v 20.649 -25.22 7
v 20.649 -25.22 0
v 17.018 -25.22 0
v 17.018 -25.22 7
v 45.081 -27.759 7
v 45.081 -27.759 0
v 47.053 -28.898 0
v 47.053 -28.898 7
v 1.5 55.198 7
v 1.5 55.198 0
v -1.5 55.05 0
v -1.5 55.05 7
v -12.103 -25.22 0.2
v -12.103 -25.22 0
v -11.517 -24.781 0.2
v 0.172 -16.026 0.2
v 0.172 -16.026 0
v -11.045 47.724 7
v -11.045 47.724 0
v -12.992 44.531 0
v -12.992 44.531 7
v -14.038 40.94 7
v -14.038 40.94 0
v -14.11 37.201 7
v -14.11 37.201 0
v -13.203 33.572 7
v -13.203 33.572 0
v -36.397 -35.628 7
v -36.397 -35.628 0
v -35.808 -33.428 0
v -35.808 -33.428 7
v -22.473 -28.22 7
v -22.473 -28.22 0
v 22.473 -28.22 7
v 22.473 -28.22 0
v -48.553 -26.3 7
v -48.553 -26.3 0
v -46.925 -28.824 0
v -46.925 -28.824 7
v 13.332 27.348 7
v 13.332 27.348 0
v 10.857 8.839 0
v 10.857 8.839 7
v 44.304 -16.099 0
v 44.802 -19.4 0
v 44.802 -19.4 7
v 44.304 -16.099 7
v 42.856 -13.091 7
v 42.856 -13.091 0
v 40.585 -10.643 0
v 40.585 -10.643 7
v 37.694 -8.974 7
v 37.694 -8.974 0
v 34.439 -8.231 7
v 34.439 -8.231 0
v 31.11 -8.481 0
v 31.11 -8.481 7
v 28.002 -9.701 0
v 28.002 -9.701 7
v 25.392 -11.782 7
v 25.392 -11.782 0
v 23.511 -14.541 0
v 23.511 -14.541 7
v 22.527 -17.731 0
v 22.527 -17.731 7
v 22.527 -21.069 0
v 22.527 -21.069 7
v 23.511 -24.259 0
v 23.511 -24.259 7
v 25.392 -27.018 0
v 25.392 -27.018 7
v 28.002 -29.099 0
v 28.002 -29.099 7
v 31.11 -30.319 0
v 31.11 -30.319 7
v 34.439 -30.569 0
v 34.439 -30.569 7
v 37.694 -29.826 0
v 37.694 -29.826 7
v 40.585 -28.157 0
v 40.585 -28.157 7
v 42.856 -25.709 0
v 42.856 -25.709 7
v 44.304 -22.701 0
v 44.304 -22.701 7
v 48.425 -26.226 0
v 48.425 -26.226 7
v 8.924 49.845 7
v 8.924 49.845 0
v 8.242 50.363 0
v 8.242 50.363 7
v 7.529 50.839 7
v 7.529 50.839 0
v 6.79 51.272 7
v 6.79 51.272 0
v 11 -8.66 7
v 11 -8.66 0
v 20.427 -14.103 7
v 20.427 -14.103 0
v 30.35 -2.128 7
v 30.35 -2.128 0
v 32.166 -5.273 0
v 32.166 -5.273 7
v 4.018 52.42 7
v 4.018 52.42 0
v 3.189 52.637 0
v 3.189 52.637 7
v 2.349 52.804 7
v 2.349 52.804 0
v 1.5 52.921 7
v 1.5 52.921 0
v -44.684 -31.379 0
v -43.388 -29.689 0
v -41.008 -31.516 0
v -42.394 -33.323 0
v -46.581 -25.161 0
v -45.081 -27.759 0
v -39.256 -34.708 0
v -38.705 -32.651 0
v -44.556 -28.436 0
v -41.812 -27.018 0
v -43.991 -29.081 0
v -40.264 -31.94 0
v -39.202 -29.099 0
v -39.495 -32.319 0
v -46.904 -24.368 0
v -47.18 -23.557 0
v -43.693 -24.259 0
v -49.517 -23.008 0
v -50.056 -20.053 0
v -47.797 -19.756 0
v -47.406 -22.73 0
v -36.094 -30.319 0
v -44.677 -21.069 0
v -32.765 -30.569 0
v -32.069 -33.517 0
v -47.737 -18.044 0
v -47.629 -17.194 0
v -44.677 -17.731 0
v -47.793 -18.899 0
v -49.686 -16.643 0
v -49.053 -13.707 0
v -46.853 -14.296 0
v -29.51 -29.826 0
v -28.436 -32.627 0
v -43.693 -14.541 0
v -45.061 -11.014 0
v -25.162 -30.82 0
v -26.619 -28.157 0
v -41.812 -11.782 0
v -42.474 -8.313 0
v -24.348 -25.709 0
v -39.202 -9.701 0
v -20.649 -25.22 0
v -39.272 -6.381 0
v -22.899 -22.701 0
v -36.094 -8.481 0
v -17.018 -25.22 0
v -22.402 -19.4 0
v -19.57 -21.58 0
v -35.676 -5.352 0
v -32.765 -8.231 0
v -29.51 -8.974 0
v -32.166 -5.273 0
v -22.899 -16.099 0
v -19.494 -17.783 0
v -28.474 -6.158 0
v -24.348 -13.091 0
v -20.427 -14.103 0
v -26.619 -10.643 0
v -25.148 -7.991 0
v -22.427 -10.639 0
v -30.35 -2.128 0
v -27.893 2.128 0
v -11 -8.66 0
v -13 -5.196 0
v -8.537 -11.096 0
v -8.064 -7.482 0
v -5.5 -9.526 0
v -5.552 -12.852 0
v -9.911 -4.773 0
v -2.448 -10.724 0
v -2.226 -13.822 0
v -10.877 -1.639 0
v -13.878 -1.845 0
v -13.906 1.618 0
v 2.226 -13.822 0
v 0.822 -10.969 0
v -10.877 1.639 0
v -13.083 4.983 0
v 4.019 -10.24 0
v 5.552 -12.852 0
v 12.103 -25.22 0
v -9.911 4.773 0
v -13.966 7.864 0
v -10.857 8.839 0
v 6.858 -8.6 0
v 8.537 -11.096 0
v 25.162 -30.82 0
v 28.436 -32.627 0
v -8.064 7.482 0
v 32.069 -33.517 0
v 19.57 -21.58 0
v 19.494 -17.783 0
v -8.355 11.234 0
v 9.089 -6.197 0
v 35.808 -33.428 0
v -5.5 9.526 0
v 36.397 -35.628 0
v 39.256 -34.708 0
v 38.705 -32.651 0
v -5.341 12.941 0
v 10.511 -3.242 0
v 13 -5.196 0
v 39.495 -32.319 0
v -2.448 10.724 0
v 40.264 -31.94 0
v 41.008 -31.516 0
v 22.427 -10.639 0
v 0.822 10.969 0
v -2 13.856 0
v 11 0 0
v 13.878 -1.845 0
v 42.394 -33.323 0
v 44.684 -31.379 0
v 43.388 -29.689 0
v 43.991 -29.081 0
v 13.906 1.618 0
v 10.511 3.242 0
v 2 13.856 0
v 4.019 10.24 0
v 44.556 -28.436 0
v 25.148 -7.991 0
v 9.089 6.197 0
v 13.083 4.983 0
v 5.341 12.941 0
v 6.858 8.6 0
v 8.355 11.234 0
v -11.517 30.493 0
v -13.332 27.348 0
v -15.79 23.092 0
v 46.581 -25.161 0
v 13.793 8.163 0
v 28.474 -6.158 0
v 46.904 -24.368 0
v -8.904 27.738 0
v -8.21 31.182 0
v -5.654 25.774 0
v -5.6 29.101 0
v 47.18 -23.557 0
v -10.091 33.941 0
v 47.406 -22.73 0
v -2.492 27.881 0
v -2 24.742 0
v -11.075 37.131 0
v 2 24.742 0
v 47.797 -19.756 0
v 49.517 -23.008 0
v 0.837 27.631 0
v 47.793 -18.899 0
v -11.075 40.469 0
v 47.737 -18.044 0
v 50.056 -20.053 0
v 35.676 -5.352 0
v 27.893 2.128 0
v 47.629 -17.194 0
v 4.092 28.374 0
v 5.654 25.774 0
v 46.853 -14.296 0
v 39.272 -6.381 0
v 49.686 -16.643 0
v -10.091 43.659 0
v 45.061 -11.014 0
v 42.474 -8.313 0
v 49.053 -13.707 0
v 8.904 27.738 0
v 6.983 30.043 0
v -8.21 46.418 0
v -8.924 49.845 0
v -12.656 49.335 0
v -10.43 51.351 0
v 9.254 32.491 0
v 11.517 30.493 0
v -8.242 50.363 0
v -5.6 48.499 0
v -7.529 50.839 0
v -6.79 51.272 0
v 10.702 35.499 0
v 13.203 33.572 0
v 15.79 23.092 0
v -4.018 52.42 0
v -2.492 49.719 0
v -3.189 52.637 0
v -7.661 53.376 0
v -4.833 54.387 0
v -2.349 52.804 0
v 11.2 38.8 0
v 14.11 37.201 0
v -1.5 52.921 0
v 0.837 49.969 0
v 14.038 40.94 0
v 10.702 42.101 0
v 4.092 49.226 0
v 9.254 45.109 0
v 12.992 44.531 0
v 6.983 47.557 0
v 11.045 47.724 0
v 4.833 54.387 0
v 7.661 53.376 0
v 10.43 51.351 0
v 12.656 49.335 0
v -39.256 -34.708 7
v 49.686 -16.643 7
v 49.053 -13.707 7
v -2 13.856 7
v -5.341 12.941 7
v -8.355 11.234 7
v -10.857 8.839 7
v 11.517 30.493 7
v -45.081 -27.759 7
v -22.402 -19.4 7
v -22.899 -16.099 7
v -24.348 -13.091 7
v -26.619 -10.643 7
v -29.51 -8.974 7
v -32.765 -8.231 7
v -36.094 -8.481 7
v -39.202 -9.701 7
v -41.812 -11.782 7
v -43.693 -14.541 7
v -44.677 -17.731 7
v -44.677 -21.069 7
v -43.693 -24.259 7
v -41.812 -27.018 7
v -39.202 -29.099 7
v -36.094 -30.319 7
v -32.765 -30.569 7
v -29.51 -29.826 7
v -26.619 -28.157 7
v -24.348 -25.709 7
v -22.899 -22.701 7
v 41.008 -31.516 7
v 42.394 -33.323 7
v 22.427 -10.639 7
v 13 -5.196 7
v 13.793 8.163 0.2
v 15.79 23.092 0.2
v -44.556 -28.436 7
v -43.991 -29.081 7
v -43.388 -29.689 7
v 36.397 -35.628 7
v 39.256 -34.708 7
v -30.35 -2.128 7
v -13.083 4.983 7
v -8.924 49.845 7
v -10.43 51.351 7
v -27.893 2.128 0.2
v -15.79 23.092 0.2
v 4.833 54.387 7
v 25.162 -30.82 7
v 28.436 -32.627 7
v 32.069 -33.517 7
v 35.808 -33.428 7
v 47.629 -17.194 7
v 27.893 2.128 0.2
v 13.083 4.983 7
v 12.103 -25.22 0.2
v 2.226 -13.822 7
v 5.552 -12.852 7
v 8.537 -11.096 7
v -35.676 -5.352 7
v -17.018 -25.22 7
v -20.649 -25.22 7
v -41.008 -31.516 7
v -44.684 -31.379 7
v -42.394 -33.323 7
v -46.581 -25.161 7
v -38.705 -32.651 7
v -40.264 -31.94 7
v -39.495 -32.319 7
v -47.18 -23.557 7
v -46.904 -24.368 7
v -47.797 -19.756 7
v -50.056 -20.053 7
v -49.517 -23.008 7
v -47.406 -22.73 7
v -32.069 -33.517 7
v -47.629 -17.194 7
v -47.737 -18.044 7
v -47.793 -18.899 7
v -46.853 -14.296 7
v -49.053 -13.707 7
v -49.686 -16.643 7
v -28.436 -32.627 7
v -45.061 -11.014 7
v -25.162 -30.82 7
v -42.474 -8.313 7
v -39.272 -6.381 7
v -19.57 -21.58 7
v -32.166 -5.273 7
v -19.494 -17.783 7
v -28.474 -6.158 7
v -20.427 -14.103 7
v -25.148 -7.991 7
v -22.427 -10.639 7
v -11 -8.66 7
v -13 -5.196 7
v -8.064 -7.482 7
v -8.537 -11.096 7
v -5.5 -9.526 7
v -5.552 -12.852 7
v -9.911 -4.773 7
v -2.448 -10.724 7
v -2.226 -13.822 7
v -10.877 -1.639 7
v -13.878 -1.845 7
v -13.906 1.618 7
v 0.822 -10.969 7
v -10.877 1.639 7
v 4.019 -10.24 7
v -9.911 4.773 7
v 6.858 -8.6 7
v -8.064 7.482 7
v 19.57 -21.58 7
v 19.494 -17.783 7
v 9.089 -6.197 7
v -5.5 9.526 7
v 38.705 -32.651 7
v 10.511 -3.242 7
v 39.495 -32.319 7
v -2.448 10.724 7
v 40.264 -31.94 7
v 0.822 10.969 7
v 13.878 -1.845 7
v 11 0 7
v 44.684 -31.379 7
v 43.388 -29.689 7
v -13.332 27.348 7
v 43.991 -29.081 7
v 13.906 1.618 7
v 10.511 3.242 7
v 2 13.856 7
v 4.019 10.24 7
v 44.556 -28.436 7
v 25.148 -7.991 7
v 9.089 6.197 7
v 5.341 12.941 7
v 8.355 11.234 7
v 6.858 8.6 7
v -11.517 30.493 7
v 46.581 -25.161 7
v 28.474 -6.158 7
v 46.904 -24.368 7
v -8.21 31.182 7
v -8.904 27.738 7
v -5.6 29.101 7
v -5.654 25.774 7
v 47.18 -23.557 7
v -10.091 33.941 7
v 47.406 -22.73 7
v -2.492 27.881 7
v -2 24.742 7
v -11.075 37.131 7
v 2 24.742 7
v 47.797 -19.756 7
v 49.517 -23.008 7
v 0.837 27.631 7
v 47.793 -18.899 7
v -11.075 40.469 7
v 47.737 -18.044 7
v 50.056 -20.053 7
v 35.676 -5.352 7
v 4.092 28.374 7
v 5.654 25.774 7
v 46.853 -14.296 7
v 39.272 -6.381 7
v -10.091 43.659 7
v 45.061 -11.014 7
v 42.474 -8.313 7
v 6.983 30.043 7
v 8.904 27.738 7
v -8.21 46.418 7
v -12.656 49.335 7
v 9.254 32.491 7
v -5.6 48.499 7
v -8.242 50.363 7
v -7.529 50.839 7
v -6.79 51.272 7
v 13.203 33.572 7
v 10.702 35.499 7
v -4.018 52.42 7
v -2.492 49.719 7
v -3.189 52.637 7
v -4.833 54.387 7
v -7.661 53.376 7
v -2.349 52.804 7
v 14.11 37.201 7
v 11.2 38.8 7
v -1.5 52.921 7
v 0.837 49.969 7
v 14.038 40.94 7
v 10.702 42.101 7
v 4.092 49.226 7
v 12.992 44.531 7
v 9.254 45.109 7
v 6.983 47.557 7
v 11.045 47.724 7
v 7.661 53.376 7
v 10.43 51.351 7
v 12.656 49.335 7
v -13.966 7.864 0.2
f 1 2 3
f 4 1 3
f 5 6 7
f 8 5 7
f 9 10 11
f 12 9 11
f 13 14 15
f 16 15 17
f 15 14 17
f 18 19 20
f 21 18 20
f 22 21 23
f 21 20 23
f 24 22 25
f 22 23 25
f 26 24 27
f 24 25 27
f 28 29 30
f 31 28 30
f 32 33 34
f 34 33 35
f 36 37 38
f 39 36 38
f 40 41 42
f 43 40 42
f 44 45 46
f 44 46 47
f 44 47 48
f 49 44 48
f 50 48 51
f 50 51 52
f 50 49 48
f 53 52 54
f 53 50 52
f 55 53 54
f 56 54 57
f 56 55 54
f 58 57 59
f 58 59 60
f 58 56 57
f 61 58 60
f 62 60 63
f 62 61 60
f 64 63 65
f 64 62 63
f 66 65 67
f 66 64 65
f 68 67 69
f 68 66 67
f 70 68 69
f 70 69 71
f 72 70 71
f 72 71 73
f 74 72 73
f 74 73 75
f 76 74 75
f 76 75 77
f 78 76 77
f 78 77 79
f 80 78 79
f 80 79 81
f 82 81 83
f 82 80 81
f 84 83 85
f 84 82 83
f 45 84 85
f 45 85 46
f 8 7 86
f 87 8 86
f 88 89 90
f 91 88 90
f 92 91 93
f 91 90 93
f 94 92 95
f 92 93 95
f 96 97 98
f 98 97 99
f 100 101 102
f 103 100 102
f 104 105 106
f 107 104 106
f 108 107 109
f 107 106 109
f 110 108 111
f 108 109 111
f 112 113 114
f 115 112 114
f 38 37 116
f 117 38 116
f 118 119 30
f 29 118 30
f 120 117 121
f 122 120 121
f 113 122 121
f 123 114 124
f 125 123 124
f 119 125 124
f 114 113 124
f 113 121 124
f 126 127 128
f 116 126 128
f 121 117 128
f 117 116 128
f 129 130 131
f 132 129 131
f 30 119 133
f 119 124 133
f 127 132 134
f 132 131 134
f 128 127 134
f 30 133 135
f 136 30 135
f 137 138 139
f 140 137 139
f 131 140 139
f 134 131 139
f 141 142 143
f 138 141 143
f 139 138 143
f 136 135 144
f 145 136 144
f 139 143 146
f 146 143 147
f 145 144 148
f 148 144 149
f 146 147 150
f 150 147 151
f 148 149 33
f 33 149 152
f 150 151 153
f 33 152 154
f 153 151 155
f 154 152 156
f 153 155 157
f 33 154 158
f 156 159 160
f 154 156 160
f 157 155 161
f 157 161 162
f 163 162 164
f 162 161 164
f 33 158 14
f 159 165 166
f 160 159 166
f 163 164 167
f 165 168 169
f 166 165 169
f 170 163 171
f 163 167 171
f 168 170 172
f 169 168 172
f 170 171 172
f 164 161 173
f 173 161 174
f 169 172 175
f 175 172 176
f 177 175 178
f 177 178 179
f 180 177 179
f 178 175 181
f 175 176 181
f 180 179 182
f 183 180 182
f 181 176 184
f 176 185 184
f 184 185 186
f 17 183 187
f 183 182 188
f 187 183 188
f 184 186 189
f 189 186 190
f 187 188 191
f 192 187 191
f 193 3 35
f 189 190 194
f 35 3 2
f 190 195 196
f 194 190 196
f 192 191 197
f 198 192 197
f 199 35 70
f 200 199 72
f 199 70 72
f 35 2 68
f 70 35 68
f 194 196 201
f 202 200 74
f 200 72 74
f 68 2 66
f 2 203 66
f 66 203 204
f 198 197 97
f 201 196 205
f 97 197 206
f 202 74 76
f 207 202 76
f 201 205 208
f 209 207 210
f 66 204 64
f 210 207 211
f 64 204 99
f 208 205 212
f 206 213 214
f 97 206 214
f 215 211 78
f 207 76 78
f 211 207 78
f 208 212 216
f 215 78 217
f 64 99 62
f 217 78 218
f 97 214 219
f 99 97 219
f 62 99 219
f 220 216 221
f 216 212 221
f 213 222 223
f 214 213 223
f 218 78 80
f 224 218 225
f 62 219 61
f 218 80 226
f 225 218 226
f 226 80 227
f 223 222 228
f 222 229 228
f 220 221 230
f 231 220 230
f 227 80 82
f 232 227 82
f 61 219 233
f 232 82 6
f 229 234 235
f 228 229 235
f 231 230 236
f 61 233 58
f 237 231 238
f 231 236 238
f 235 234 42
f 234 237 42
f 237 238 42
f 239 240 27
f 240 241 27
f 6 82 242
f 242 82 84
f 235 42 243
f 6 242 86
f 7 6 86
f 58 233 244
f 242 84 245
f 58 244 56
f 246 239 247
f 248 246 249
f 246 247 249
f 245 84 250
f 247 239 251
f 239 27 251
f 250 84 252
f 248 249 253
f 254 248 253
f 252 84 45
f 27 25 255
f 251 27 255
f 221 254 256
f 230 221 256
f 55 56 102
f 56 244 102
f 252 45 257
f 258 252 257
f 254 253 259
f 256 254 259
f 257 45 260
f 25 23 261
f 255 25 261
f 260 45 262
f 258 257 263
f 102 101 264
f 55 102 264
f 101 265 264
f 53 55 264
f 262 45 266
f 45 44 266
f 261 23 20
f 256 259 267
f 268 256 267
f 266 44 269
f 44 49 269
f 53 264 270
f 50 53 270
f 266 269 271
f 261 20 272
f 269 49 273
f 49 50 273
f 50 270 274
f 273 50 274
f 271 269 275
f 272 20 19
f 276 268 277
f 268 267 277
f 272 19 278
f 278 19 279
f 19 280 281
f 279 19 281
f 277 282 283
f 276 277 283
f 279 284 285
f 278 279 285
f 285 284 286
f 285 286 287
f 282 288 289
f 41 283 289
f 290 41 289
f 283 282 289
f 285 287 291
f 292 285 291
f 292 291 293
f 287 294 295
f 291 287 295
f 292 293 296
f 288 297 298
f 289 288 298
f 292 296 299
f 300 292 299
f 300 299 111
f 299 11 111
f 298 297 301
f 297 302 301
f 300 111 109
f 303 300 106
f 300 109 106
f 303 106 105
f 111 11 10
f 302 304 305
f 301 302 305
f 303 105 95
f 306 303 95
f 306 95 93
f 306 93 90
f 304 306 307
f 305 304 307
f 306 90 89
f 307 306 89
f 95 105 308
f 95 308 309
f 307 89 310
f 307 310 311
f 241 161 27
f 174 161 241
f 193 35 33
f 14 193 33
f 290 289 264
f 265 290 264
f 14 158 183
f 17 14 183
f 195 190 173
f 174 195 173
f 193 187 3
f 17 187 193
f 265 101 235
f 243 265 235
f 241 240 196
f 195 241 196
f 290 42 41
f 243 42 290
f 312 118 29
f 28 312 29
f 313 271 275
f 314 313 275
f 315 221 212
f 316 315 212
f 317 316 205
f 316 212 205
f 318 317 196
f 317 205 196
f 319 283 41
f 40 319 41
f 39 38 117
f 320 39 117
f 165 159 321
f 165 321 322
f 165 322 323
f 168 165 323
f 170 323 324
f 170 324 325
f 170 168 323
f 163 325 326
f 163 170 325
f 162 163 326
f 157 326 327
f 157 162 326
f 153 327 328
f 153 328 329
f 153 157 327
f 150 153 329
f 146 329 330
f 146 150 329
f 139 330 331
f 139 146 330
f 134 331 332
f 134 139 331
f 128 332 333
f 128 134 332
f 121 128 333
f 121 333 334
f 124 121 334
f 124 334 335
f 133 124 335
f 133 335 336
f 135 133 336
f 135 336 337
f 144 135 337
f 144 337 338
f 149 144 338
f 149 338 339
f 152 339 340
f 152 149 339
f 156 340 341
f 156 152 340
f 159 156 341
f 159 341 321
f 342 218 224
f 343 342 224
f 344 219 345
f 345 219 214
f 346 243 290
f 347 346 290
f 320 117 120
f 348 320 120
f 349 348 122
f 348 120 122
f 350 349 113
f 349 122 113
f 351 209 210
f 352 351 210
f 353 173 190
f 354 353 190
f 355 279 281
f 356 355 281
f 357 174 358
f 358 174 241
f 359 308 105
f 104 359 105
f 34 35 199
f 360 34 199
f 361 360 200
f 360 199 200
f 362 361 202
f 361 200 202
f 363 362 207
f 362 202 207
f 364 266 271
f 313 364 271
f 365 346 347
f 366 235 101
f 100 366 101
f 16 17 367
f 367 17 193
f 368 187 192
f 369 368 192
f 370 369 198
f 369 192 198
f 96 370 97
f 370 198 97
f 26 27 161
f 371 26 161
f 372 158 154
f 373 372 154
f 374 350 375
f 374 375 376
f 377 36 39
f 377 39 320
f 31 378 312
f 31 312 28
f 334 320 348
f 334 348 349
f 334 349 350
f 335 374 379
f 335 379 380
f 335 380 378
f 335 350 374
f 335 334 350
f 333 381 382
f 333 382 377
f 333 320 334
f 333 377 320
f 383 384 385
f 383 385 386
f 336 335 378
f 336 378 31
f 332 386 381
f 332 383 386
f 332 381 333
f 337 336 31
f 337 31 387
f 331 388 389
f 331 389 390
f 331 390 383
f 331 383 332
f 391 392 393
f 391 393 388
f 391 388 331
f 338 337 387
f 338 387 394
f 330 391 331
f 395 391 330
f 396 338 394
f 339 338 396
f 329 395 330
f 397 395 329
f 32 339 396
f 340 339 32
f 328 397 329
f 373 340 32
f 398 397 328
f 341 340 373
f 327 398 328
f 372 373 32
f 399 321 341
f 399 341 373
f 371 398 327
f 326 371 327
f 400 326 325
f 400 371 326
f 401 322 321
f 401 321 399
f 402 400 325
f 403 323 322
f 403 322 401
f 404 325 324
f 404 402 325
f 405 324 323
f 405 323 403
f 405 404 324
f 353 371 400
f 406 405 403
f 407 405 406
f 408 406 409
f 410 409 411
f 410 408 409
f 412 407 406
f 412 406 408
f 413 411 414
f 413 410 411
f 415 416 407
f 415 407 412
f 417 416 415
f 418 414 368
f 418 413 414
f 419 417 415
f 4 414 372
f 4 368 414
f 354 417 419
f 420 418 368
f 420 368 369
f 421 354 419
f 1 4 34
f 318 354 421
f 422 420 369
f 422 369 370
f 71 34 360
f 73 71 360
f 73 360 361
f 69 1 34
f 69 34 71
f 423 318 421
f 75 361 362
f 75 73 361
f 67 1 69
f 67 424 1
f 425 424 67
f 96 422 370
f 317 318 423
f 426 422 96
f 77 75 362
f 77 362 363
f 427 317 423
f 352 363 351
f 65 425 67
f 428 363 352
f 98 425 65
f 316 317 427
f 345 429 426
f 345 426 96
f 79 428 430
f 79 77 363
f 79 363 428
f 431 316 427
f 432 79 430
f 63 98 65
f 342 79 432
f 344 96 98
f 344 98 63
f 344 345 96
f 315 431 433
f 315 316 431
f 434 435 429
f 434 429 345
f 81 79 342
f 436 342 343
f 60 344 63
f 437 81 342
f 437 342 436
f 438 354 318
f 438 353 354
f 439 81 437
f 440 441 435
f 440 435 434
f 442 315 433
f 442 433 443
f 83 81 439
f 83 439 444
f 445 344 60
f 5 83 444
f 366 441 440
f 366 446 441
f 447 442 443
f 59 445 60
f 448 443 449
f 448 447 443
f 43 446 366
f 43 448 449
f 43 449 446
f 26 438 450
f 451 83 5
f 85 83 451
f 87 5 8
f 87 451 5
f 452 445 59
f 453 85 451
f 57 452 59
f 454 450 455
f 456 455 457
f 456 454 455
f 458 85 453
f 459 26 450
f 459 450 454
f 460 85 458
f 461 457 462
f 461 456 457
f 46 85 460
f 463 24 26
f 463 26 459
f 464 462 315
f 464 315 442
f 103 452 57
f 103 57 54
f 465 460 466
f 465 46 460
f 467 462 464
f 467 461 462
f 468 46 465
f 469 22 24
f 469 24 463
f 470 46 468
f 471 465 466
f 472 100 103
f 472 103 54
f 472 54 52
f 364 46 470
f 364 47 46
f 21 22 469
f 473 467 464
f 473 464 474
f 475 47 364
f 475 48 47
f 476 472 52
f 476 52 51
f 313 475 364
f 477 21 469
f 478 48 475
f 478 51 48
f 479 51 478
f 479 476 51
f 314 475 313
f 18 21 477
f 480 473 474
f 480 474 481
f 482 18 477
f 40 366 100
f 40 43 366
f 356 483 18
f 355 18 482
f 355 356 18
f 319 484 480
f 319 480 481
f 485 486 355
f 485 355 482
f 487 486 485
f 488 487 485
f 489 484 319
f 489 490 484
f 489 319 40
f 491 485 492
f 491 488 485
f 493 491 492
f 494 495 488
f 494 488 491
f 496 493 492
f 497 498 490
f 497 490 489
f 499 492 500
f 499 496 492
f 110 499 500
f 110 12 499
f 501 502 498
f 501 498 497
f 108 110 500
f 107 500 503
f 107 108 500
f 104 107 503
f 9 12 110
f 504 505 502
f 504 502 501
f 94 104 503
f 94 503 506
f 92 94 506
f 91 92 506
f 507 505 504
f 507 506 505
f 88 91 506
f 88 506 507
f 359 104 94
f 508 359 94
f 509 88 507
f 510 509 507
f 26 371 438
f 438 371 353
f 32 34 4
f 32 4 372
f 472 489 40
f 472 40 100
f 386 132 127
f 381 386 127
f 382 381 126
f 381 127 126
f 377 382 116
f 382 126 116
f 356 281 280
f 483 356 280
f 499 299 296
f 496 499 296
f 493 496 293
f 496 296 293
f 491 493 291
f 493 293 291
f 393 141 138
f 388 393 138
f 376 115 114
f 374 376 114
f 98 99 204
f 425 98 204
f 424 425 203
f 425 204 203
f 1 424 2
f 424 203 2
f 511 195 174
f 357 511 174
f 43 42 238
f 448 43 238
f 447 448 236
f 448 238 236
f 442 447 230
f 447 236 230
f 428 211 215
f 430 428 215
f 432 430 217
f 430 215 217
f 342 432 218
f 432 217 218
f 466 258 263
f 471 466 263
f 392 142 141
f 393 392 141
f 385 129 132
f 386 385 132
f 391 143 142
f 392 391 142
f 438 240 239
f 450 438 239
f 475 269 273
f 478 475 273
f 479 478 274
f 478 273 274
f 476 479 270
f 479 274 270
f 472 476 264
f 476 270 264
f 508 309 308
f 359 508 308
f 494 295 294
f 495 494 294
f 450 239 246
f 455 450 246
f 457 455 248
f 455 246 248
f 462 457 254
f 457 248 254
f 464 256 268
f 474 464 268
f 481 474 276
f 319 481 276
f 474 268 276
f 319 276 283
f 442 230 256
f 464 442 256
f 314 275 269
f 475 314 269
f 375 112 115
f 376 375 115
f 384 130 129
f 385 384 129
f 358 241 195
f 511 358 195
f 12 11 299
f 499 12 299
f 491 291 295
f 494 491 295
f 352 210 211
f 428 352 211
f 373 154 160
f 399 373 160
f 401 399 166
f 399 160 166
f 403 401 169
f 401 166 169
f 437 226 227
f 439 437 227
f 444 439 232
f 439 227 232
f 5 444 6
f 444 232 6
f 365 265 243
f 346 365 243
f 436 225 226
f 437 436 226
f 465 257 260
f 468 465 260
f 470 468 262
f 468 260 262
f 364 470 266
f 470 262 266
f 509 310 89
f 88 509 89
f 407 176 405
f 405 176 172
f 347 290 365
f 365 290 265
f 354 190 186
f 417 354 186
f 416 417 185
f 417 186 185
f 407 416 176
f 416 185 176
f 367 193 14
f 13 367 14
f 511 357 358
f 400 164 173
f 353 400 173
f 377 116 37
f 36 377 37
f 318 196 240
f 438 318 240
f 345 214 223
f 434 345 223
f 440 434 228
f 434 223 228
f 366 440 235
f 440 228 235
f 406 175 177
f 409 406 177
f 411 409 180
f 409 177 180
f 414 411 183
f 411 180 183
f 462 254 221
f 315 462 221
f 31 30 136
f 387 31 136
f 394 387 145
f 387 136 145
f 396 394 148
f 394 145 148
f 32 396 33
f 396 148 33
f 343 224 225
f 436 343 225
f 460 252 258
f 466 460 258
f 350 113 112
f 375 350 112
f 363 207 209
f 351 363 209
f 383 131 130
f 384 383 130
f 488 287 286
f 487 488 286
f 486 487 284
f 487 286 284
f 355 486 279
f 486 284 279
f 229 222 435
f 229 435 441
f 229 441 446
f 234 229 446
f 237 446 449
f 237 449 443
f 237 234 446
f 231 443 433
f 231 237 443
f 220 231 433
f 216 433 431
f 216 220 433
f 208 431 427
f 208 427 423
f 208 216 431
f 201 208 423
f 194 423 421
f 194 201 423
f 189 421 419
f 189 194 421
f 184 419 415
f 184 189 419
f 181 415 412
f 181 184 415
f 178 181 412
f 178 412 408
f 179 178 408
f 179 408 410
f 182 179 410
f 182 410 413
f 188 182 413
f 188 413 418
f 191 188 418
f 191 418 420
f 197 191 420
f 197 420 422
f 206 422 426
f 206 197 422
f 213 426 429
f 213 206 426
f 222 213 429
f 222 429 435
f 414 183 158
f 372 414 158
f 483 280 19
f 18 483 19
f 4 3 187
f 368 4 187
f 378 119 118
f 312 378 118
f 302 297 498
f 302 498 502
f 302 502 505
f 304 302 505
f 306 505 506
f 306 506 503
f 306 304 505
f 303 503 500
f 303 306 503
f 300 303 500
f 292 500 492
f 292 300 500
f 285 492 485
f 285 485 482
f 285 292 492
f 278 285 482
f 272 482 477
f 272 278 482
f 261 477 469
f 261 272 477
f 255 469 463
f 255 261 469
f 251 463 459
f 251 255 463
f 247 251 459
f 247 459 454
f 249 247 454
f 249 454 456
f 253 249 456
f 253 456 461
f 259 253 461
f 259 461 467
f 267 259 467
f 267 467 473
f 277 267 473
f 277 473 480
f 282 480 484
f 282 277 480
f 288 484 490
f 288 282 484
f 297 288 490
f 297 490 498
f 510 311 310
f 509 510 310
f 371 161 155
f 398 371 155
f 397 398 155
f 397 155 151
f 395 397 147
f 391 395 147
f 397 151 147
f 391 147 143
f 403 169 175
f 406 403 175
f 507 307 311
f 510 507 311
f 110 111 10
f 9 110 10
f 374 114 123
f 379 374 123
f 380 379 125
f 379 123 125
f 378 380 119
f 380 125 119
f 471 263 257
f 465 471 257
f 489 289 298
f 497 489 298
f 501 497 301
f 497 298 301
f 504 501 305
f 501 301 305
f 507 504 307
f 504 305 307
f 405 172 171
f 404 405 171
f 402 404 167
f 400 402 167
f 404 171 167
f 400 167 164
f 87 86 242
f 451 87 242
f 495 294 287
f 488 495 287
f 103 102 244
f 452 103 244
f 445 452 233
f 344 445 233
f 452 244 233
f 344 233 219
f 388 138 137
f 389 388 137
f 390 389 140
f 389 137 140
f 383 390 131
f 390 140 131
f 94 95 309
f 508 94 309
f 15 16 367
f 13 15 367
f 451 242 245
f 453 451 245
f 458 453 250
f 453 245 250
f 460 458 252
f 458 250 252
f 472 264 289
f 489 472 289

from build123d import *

# Parameters (mm, degrees)
F0_R     = 11.2
F0_R_2   = 11
F1_DEPTH = 7
F3_DEPTH = 6.8


with BuildPart() as f1:
    # F0 (on Top) → F1 (new body)
    with BuildSketch(Plane.XY):
        with BuildLine():
            Line((-12.6559794838, 49.3346591402), (-11.0453985259, 47.7240781823))
            ThreePointArc((-11.0453985259, 47.7240781823), (-14.0378256841, 40.9399649675), (-13.2027236571, 33.572372619))
            Line((-13.2027236571, 33.572372619), (-35.6758893819, -5.3522922233))
            ThreePointArc((-35.6758893819, -5.3522922233), (-42.473962534, -8.3128688274), (-46.852963341, -14.2964433728))
            Line((-46.852963341, -14.2964433728), (-49.0530578444, -13.7069298274))
            Line((-49.0530578444, -13.7069298274), (-49.6863089117, -16.6430792565))
            Line((-49.6863089117, -16.6430792565), (-47.6294204763, -17.1942208517))
            ThreePointArc((-47.6294204763, -17.1942208517), (-47.7713823768, -18.4712755649), (-47.7973240691, -19.7559346444))
            Line((-47.7973240691, -19.7559346444), (-50.0555434173, -20.0532348617))
            Line((-50.0555434173, -20.0532348617), (-49.5169753758, -23.0082179156))
            Line((-49.5169753758, -23.0082179156), (-47.4057454924, -22.7302692285))
            ThreePointArc((-47.4057454924, -22.7302692285), (-47.0481935057, -23.9644404073), (-46.5805427582, -25.1612380929))
            Line((-46.5805427582, -25.1612380929), (-48.5530935264, -26.3000908099))
            Line((-48.5530935264, -26.3000908099), (-46.9246984783, -28.8240381057))
            Line((-46.9246984783, -28.8240381057), (-45.0805427582, -27.7593143042))
            ThreePointArc((-45.0805427582, -27.7593143042), (-44.277910933, -28.7627105744), (-43.3878633329, -29.6894452675))
            Line((-43.3878633329, -29.6894452675), (-44.6841888987, -31.3788496362))
            Line((-44.6841888987, -31.3788496362), (-42.3943825269, -33.3227547688))
            Line((-42.3943825269, -33.3227547688), (-41.0078033121, -31.5157295545))
            ThreePointArc((-41.0078033121, -31.5157295545), (-39.8822850679, -32.1355929298), (-38.705342294, -32.6511776742))
            Line((-38.705342294, -32.6511776742), (-39.2564838892, -34.7080661095))
            Line((-39.2564838892, -34.7080661095), (-36.3970783606, -35.6277293129))
            Line((-36.3970783606, -35.6277293129), (-35.8075648151, -33.4276348095))
            ThreePointArc((-35.8075648151, -33.4276348095), (-28.4361368498, -32.6270961401), (-22.4731657248, -28.2200803957))
            Line((-22.4731657248, -28.2200803957), (22.4731657248, -28.2200803957))
            ThreePointArc((22.4731657248, -28.2200803957), (28.4361368498, -32.6270961401), (35.8075648151, -33.4276348095))
            Line((35.8075648151, -33.4276348095), (36.3970783606, -35.6277293129))
            Line((36.3970783606, -35.6277293129), (39.2564838892, -34.7080661095))
            Line((39.2564838892, -34.7080661095), (38.705342294, -32.6511776742))
            ThreePointArc((38.705342294, -32.6511776742), (39.8822850679, -32.1355929298), (41.0078033121, -31.5157295545))
            Line((41.0078033121, -31.5157295545), (42.3943825269, -33.3227547688))
            Line((42.3943825269, -33.3227547688), (44.6841888987, -31.3788496362))
            Line((44.6841888987, -31.3788496362), (43.3878633329, -29.6894452675))
            ThreePointArc((43.3878633329, -29.6894452675), (44.277910933, -28.7627105744), (45.0805427582, -27.7593143042))
            Line((45.0805427582, -27.7593143042), (47.0530935264, -28.8981670212))
            Line((47.0530935264, -28.8981670212), (48.4246984783, -26.2259618943))
            Line((48.4246984783, -26.2259618943), (46.5805427582, -25.1612380929))
            ThreePointArc((46.5805427582, -25.1612380929), (47.0481935057, -23.9644404073), (47.4057454924, -22.7302692285))
            Line((47.4057454924, -22.7302692285), (49.5169753758, -23.0082179156))
            Line((49.5169753758, -23.0082179156), (50.0555434173, -20.0532348617))
            Line((50.0555434173, -20.0532348617), (47.7973240691, -19.7559346444))
            ThreePointArc((47.7973240691, -19.7559346444), (47.7713823768, -18.4712755649), (47.6294204763, -17.1942208517))
            Line((47.6294204763, -17.1942208517), (49.6863089117, -16.6430792565))
            Line((49.6863089117, -16.6430792565), (49.0530578444, -13.7069298274))
            Line((49.0530578444, -13.7069298274), (46.852963341, -14.2964433728))
            ThreePointArc((46.852963341, -14.2964433728), (42.473962534, -8.3128688274), (35.6758893819, -5.3522922233))
            Line((35.6758893819, -5.3522922233), (13.2027236571, 33.572372619))
            ThreePointArc((13.2027236571, 33.572372619), (14.0378256841, 40.9399649675), (11.0453985259, 47.7240781823))
            Line((11.0453985259, 47.7240781823), (12.6559794838, 49.3346591402))
            Line((12.6559794838, 49.3346591402), (10.4298250225, 51.3511453661))
            Line((10.4298250225, 51.3511453661), (8.9240781823, 49.8453985259))
            ThreePointArc((8.9240781823, 49.8453985259), (7.8890973089, 50.6068684947), (6.789520757, 51.2716641989))
            Line((6.789520757, 51.2716641989), (7.6611608904, 53.3759896304))
            Line((7.6611608904, 53.3759896304), (4.8327864772, 54.3870675519))
            Line((4.8327864772, 54.3870675519), (4.0178821595, 52.419714496))
            ThreePointArc((4.0178821595, 52.419714496), (2.7702825726, 52.7271509817), (1.5, 52.9205523971))
            Line((1.5, 52.9205523971), (1.5, 55.1982578311))
            Line((1.5, 55.1982578311), (-1.5, 55.05))
            Line((-1.5, 55.05), (-1.5, 52.9205523971))
            ThreePointArc((-1.5, 52.9205523971), (-2.7702825726, 52.7271509817), (-4.0178821595, 52.419714496))
            Line((-4.0178821595, 52.419714496), (-4.8327864772, 54.3870675519))
            Line((-4.8327864772, 54.3870675519), (-7.6611608904, 53.3759896304))
            Line((-7.6611608904, 53.3759896304), (-6.789520757, 51.2716641989))
            ThreePointArc((-6.789520757, 51.2716641989), (-7.8890973089, 50.6068684947), (-8.9240781823, 49.8453985259))
            Line((-8.9240781823, 49.8453985259), (-10.4298250225, 51.3511453661))
            Line((-10.4298250225, 51.3511453661), (-12.6559794838, 49.3346591402))
        make_face()
        with Locations((-33.6017856668, -19.4)):
            Circle(F0_R, mode=Mode.SUBTRACT)
        Polygon((-12.1033156734, -25.2200803957), (0.172366893, -16.0264908435), (12.1033156734, -25.2200803957), align=None, mode=Mode.SUBTRACT)
        with BuildLine():
            Line((-20.4268113342, -14.1028260993), (-11, -8.6602540378))
            ThreePointArc((-11, -8.6602540378), (-7.0988974128, -12.0667168494), (-2.2263110665, -13.8218500583))
            Line((-2.2263110665, -13.8218500583), (-17.0183247375, -25.2200803957))
            Line((-17.0183247375, -25.2200803957), (-20.649308522, -25.2200803957))
            ThreePointArc((-20.649308522, -25.2200803957), (-19.4046286997, -19.6841373792), (-20.4268113342, -14.1028260993))
        make_face(mode=Mode.SUBTRACT)
        with BuildLine():
            ThreePointArc((-13.0832288111, 4.9828830888), (-13.9995320382, -0.1144670736), (-13, -5.1961524227))
            Line((-13, -5.1961524227), (-22.4268113342, -10.6387244841))
            ThreePointArc((-22.4268113342, -10.6387244841), (-26.7492773718, -6.9628327153), (-32.1658845691, -5.2727855528))
            Line((-32.1658845691, -5.2727855528), (-30.3503926769, -2.1282613547))
            Line((-30.3503926769, -2.1282613547), (-13.0832288111, 4.9828830888))
        make_face(mode=Mode.SUBTRACT)
        with BuildLine():
            ThreePointArc((2.2263110665, -13.8218500583), (7.0988974128, -12.0667168494), (11, -8.6602540378))
            Line((11, -8.6602540378), (20.4268113342, -14.1028260993))
            ThreePointArc((20.4268113342, -14.1028260993), (19.4046286997, -19.6841373792), (20.649308522, -25.2200803957))
            Line((20.649308522, -25.2200803957), (17.0183247375, -25.2200803957))
            Line((17.0183247375, -25.2200803957), (2.2263110665, -13.8218500583))
        make_face(mode=Mode.SUBTRACT)
        with Locations((33.6017856668, -19.4)):
            Circle(F0_R, mode=Mode.SUBTRACT)
        with BuildLine():
            Line((22.4268113342, -10.6387244841), (13, -5.1961524227))
            ThreePointArc((13, -5.1961524227), (13.9995320382, -0.1144670736), (13.0832288111, 4.9828830888))
            Line((13.0832288111, 4.9828830888), (30.3503926769, -2.1282613547))
            Line((30.3503926769, -2.1282613547), (32.1658845691, -5.2727855528))
            ThreePointArc((32.1658845691, -5.2727855528), (26.7492773718, -6.9628327153), (22.4268113342, -10.6387244841))
        make_face(mode=Mode.SUBTRACT)
        Circle(F0_R_2, mode=Mode.SUBTRACT)
        Polygon((-15.7895724715, 23.091819041), (-13.9655316505, 7.8639713136), (-27.8928881448, 2.1282613547), align=None, mode=Mode.SUBTRACT)
        with BuildLine():
            Line((-2, 24.7415505834), (-2, 13.8564064606))
            ThreePointArc((-2, 13.8564064606), (-6.9006346255, 12.181183923), (-10.8569177445, 8.8389669695))
            Line((-10.8569177445, 8.8389669695), (-13.3320679394, 27.3483417504))
            Line((-13.3320679394, 27.3483417504), (-11.5165760472, 30.4928659485))
            ThreePointArc((-11.5165760472, 30.4928659485), (-7.3446486721, 26.6469700945), (-2, 24.7415505834))
        make_face(mode=Mode.SUBTRACT)
        with BuildLine():
            ThreePointArc((10.8569177445, 8.8389669695), (6.9006346255, 12.181183923), (2, 13.8564064606))
            Line((2, 13.8564064606), (2, 24.7415505834))
            ThreePointArc((2, 24.7415505834), (7.3446486721, 26.6469700945), (11.5165760472, 30.4928659485))
            Line((11.5165760472, 30.4928659485), (13.3320679394, 27.3483417504))
            Line((13.3320679394, 27.3483417504), (10.8569177445, 8.8389669695))
        make_face(mode=Mode.SUBTRACT)
        Polygon((27.8928881448, 2.1282613547), (13.7931647575, 8.1625195299), (15.7895724715, 23.091819041), align=None, mode=Mode.SUBTRACT)
        with Locations((0, 38.8)):
            Circle(F0_R, mode=Mode.SUBTRACT)
    extrude(amount=F1_DEPTH)

    # F2 (on face) → F3 (join)
    with BuildSketch(Plane.XY.offset(7)):
        Polygon((27.8928881448, 2.1282613547), (15.7895724715, 23.091819041), (13.7931647575, 8.1625195299), align=None)
        Polygon((-12.1033156734, -25.2200803957), (12.1033156734, -25.2200803957), (0.172366893, -16.0264908435), (-11.5165760472, -24.7806552747), align=None)
        Polygon((-13.9655316505, 7.8639713136), (-15.7895724715, 23.091819041), (-27.8928881448, 2.1282613547), align=None)
    extrude(amount=-F3_DEPTH)


solid = f1.part
